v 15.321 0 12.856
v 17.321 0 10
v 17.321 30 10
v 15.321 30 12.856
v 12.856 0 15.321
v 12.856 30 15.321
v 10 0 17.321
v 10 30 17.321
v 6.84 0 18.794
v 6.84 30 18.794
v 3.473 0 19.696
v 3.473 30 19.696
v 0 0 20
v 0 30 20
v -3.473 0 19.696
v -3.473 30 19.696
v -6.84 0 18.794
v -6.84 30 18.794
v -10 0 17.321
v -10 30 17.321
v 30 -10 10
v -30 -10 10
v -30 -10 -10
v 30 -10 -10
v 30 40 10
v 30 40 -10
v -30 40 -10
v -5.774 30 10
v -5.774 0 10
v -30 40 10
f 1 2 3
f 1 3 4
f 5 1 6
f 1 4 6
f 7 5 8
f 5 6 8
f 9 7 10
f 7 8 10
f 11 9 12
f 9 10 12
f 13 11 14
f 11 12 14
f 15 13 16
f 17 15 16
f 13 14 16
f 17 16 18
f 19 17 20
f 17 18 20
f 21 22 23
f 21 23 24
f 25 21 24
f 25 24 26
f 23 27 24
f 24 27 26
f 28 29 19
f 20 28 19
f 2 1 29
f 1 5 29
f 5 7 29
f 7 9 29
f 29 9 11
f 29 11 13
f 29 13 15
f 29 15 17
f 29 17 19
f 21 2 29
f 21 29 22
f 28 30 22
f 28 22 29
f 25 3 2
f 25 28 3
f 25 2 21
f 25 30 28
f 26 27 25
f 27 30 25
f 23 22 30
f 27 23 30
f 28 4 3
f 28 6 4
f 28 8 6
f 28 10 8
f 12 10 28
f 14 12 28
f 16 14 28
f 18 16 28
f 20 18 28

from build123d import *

# Parameters (mm, degrees)
SKETCH1_W           = 60
SKETCH1_H           = 50
BOSS_EXTRUDE1_DEPTH = 10
SKETCH2_W           = 15
SKETCH2_H           = 30
REVOLVE1_ANGLE      = 120


with BuildPart() as part:
    # Sketch1 → Boss-Extrude1 (new, symmetric)
    with BuildSketch(Plane.XY):
        with Locations((0, 15)):
            Rectangle(SKETCH1_W, SKETCH1_H)
    extrude(amount=BOSS_EXTRUDE1_DEPTH, both=True)

    # Sketch2 → Revolve1 (revolve)
    with BuildSketch(Plane.XY):
        with Locations((12.5, 15)):
            Rectangle(SKETCH2_W, SKETCH2_H)
    revolve(axis=Axis((0, 0, 0), (0, -1, 0)), revolution_arc=REVOLVE1_ANGLE)


solid = part.part
